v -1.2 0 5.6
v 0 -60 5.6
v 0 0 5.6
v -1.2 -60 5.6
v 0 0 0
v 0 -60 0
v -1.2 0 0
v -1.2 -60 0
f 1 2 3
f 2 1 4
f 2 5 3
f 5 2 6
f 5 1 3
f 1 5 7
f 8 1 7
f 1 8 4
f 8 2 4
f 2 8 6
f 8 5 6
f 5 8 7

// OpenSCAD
//$fn=60;
$fa=5;
$fs=.4;

D_tab = 11.6;
D_pen = 16.8;
wall_thick = 2.4;
tab_ext = 5.6;
part_width = 10;
join_len = 40+2*part_width;


rotate([90,0,0]) main();

//holder();
//joiner();

module main(){
    holder();
    translate([0,0,join_len-part_width]) holder();
    rotate([0,-90,0]) joiner();
}

module joiner(){
    linear_extrude(height=wall_thick/2) square([join_len,tab_ext],center=false);
}

module holder(){
    linear_extrude(height=part_width) union(){
        pen_part();
        table_part();
        back_part();
    }
}

module table_part(){
    mirror([0,1,0]){
        difference(){
            union(){
                square([D_tab/2,D_tab/2],center=false);
                translate([D_tab/2,D_tab/2,0]) circle(d=D_tab+2*wall_thick);
            }
            translate([D_tab/2,D_tab/2,0]) circle(d=D_tab);
            translate([0,D_tab/2,0]) square([D_tab+2*wall_thick,D_tab/2+wall_thick],center=false);
            translate([0,-D_tab/2,0]) square([D_tab+wall_thick,D_tab/2],center=false);
            translate([-wall_thick,0,0]) square([wall_thick,D_tab],center=false);
        }
        translate([D_tab,D_tab/2,0]) square([wall_thick,tab_ext],center=false);
    }
}

module pen_part(){
    difference(){
        union(){
            square([D_pen/2+wall_thick,D_pen/2+wall_thick],center=false);
            translate([D_pen/2+wall_thick,D_pen/2+wall_thick,0]) circle(d=D_pen+2*wall_thick);
        }
        translate([D_pen/2+wall_thick,D_pen/2+wall_thick,0]) circle(d=D_pen);
        translate([0,D_pen/2+wall_thick,0]) square([D_pen+2*wall_thick,D_pen/2+wall_thick],center=false);
    }
}

module back_part(){
    
    difference(){
        translate([-wall_thick/2,-(D_tab/2+tab_ext)*3/2,0]) square([wall_thick/2,(D_pen+2*wall_thick)/2+(D_tab/2+tab_ext)*3/2],center=false);
        translate([-wall_thick/2,0,0]) square([wall_thick/2,tab_ext],center=false);
    }
    
}
